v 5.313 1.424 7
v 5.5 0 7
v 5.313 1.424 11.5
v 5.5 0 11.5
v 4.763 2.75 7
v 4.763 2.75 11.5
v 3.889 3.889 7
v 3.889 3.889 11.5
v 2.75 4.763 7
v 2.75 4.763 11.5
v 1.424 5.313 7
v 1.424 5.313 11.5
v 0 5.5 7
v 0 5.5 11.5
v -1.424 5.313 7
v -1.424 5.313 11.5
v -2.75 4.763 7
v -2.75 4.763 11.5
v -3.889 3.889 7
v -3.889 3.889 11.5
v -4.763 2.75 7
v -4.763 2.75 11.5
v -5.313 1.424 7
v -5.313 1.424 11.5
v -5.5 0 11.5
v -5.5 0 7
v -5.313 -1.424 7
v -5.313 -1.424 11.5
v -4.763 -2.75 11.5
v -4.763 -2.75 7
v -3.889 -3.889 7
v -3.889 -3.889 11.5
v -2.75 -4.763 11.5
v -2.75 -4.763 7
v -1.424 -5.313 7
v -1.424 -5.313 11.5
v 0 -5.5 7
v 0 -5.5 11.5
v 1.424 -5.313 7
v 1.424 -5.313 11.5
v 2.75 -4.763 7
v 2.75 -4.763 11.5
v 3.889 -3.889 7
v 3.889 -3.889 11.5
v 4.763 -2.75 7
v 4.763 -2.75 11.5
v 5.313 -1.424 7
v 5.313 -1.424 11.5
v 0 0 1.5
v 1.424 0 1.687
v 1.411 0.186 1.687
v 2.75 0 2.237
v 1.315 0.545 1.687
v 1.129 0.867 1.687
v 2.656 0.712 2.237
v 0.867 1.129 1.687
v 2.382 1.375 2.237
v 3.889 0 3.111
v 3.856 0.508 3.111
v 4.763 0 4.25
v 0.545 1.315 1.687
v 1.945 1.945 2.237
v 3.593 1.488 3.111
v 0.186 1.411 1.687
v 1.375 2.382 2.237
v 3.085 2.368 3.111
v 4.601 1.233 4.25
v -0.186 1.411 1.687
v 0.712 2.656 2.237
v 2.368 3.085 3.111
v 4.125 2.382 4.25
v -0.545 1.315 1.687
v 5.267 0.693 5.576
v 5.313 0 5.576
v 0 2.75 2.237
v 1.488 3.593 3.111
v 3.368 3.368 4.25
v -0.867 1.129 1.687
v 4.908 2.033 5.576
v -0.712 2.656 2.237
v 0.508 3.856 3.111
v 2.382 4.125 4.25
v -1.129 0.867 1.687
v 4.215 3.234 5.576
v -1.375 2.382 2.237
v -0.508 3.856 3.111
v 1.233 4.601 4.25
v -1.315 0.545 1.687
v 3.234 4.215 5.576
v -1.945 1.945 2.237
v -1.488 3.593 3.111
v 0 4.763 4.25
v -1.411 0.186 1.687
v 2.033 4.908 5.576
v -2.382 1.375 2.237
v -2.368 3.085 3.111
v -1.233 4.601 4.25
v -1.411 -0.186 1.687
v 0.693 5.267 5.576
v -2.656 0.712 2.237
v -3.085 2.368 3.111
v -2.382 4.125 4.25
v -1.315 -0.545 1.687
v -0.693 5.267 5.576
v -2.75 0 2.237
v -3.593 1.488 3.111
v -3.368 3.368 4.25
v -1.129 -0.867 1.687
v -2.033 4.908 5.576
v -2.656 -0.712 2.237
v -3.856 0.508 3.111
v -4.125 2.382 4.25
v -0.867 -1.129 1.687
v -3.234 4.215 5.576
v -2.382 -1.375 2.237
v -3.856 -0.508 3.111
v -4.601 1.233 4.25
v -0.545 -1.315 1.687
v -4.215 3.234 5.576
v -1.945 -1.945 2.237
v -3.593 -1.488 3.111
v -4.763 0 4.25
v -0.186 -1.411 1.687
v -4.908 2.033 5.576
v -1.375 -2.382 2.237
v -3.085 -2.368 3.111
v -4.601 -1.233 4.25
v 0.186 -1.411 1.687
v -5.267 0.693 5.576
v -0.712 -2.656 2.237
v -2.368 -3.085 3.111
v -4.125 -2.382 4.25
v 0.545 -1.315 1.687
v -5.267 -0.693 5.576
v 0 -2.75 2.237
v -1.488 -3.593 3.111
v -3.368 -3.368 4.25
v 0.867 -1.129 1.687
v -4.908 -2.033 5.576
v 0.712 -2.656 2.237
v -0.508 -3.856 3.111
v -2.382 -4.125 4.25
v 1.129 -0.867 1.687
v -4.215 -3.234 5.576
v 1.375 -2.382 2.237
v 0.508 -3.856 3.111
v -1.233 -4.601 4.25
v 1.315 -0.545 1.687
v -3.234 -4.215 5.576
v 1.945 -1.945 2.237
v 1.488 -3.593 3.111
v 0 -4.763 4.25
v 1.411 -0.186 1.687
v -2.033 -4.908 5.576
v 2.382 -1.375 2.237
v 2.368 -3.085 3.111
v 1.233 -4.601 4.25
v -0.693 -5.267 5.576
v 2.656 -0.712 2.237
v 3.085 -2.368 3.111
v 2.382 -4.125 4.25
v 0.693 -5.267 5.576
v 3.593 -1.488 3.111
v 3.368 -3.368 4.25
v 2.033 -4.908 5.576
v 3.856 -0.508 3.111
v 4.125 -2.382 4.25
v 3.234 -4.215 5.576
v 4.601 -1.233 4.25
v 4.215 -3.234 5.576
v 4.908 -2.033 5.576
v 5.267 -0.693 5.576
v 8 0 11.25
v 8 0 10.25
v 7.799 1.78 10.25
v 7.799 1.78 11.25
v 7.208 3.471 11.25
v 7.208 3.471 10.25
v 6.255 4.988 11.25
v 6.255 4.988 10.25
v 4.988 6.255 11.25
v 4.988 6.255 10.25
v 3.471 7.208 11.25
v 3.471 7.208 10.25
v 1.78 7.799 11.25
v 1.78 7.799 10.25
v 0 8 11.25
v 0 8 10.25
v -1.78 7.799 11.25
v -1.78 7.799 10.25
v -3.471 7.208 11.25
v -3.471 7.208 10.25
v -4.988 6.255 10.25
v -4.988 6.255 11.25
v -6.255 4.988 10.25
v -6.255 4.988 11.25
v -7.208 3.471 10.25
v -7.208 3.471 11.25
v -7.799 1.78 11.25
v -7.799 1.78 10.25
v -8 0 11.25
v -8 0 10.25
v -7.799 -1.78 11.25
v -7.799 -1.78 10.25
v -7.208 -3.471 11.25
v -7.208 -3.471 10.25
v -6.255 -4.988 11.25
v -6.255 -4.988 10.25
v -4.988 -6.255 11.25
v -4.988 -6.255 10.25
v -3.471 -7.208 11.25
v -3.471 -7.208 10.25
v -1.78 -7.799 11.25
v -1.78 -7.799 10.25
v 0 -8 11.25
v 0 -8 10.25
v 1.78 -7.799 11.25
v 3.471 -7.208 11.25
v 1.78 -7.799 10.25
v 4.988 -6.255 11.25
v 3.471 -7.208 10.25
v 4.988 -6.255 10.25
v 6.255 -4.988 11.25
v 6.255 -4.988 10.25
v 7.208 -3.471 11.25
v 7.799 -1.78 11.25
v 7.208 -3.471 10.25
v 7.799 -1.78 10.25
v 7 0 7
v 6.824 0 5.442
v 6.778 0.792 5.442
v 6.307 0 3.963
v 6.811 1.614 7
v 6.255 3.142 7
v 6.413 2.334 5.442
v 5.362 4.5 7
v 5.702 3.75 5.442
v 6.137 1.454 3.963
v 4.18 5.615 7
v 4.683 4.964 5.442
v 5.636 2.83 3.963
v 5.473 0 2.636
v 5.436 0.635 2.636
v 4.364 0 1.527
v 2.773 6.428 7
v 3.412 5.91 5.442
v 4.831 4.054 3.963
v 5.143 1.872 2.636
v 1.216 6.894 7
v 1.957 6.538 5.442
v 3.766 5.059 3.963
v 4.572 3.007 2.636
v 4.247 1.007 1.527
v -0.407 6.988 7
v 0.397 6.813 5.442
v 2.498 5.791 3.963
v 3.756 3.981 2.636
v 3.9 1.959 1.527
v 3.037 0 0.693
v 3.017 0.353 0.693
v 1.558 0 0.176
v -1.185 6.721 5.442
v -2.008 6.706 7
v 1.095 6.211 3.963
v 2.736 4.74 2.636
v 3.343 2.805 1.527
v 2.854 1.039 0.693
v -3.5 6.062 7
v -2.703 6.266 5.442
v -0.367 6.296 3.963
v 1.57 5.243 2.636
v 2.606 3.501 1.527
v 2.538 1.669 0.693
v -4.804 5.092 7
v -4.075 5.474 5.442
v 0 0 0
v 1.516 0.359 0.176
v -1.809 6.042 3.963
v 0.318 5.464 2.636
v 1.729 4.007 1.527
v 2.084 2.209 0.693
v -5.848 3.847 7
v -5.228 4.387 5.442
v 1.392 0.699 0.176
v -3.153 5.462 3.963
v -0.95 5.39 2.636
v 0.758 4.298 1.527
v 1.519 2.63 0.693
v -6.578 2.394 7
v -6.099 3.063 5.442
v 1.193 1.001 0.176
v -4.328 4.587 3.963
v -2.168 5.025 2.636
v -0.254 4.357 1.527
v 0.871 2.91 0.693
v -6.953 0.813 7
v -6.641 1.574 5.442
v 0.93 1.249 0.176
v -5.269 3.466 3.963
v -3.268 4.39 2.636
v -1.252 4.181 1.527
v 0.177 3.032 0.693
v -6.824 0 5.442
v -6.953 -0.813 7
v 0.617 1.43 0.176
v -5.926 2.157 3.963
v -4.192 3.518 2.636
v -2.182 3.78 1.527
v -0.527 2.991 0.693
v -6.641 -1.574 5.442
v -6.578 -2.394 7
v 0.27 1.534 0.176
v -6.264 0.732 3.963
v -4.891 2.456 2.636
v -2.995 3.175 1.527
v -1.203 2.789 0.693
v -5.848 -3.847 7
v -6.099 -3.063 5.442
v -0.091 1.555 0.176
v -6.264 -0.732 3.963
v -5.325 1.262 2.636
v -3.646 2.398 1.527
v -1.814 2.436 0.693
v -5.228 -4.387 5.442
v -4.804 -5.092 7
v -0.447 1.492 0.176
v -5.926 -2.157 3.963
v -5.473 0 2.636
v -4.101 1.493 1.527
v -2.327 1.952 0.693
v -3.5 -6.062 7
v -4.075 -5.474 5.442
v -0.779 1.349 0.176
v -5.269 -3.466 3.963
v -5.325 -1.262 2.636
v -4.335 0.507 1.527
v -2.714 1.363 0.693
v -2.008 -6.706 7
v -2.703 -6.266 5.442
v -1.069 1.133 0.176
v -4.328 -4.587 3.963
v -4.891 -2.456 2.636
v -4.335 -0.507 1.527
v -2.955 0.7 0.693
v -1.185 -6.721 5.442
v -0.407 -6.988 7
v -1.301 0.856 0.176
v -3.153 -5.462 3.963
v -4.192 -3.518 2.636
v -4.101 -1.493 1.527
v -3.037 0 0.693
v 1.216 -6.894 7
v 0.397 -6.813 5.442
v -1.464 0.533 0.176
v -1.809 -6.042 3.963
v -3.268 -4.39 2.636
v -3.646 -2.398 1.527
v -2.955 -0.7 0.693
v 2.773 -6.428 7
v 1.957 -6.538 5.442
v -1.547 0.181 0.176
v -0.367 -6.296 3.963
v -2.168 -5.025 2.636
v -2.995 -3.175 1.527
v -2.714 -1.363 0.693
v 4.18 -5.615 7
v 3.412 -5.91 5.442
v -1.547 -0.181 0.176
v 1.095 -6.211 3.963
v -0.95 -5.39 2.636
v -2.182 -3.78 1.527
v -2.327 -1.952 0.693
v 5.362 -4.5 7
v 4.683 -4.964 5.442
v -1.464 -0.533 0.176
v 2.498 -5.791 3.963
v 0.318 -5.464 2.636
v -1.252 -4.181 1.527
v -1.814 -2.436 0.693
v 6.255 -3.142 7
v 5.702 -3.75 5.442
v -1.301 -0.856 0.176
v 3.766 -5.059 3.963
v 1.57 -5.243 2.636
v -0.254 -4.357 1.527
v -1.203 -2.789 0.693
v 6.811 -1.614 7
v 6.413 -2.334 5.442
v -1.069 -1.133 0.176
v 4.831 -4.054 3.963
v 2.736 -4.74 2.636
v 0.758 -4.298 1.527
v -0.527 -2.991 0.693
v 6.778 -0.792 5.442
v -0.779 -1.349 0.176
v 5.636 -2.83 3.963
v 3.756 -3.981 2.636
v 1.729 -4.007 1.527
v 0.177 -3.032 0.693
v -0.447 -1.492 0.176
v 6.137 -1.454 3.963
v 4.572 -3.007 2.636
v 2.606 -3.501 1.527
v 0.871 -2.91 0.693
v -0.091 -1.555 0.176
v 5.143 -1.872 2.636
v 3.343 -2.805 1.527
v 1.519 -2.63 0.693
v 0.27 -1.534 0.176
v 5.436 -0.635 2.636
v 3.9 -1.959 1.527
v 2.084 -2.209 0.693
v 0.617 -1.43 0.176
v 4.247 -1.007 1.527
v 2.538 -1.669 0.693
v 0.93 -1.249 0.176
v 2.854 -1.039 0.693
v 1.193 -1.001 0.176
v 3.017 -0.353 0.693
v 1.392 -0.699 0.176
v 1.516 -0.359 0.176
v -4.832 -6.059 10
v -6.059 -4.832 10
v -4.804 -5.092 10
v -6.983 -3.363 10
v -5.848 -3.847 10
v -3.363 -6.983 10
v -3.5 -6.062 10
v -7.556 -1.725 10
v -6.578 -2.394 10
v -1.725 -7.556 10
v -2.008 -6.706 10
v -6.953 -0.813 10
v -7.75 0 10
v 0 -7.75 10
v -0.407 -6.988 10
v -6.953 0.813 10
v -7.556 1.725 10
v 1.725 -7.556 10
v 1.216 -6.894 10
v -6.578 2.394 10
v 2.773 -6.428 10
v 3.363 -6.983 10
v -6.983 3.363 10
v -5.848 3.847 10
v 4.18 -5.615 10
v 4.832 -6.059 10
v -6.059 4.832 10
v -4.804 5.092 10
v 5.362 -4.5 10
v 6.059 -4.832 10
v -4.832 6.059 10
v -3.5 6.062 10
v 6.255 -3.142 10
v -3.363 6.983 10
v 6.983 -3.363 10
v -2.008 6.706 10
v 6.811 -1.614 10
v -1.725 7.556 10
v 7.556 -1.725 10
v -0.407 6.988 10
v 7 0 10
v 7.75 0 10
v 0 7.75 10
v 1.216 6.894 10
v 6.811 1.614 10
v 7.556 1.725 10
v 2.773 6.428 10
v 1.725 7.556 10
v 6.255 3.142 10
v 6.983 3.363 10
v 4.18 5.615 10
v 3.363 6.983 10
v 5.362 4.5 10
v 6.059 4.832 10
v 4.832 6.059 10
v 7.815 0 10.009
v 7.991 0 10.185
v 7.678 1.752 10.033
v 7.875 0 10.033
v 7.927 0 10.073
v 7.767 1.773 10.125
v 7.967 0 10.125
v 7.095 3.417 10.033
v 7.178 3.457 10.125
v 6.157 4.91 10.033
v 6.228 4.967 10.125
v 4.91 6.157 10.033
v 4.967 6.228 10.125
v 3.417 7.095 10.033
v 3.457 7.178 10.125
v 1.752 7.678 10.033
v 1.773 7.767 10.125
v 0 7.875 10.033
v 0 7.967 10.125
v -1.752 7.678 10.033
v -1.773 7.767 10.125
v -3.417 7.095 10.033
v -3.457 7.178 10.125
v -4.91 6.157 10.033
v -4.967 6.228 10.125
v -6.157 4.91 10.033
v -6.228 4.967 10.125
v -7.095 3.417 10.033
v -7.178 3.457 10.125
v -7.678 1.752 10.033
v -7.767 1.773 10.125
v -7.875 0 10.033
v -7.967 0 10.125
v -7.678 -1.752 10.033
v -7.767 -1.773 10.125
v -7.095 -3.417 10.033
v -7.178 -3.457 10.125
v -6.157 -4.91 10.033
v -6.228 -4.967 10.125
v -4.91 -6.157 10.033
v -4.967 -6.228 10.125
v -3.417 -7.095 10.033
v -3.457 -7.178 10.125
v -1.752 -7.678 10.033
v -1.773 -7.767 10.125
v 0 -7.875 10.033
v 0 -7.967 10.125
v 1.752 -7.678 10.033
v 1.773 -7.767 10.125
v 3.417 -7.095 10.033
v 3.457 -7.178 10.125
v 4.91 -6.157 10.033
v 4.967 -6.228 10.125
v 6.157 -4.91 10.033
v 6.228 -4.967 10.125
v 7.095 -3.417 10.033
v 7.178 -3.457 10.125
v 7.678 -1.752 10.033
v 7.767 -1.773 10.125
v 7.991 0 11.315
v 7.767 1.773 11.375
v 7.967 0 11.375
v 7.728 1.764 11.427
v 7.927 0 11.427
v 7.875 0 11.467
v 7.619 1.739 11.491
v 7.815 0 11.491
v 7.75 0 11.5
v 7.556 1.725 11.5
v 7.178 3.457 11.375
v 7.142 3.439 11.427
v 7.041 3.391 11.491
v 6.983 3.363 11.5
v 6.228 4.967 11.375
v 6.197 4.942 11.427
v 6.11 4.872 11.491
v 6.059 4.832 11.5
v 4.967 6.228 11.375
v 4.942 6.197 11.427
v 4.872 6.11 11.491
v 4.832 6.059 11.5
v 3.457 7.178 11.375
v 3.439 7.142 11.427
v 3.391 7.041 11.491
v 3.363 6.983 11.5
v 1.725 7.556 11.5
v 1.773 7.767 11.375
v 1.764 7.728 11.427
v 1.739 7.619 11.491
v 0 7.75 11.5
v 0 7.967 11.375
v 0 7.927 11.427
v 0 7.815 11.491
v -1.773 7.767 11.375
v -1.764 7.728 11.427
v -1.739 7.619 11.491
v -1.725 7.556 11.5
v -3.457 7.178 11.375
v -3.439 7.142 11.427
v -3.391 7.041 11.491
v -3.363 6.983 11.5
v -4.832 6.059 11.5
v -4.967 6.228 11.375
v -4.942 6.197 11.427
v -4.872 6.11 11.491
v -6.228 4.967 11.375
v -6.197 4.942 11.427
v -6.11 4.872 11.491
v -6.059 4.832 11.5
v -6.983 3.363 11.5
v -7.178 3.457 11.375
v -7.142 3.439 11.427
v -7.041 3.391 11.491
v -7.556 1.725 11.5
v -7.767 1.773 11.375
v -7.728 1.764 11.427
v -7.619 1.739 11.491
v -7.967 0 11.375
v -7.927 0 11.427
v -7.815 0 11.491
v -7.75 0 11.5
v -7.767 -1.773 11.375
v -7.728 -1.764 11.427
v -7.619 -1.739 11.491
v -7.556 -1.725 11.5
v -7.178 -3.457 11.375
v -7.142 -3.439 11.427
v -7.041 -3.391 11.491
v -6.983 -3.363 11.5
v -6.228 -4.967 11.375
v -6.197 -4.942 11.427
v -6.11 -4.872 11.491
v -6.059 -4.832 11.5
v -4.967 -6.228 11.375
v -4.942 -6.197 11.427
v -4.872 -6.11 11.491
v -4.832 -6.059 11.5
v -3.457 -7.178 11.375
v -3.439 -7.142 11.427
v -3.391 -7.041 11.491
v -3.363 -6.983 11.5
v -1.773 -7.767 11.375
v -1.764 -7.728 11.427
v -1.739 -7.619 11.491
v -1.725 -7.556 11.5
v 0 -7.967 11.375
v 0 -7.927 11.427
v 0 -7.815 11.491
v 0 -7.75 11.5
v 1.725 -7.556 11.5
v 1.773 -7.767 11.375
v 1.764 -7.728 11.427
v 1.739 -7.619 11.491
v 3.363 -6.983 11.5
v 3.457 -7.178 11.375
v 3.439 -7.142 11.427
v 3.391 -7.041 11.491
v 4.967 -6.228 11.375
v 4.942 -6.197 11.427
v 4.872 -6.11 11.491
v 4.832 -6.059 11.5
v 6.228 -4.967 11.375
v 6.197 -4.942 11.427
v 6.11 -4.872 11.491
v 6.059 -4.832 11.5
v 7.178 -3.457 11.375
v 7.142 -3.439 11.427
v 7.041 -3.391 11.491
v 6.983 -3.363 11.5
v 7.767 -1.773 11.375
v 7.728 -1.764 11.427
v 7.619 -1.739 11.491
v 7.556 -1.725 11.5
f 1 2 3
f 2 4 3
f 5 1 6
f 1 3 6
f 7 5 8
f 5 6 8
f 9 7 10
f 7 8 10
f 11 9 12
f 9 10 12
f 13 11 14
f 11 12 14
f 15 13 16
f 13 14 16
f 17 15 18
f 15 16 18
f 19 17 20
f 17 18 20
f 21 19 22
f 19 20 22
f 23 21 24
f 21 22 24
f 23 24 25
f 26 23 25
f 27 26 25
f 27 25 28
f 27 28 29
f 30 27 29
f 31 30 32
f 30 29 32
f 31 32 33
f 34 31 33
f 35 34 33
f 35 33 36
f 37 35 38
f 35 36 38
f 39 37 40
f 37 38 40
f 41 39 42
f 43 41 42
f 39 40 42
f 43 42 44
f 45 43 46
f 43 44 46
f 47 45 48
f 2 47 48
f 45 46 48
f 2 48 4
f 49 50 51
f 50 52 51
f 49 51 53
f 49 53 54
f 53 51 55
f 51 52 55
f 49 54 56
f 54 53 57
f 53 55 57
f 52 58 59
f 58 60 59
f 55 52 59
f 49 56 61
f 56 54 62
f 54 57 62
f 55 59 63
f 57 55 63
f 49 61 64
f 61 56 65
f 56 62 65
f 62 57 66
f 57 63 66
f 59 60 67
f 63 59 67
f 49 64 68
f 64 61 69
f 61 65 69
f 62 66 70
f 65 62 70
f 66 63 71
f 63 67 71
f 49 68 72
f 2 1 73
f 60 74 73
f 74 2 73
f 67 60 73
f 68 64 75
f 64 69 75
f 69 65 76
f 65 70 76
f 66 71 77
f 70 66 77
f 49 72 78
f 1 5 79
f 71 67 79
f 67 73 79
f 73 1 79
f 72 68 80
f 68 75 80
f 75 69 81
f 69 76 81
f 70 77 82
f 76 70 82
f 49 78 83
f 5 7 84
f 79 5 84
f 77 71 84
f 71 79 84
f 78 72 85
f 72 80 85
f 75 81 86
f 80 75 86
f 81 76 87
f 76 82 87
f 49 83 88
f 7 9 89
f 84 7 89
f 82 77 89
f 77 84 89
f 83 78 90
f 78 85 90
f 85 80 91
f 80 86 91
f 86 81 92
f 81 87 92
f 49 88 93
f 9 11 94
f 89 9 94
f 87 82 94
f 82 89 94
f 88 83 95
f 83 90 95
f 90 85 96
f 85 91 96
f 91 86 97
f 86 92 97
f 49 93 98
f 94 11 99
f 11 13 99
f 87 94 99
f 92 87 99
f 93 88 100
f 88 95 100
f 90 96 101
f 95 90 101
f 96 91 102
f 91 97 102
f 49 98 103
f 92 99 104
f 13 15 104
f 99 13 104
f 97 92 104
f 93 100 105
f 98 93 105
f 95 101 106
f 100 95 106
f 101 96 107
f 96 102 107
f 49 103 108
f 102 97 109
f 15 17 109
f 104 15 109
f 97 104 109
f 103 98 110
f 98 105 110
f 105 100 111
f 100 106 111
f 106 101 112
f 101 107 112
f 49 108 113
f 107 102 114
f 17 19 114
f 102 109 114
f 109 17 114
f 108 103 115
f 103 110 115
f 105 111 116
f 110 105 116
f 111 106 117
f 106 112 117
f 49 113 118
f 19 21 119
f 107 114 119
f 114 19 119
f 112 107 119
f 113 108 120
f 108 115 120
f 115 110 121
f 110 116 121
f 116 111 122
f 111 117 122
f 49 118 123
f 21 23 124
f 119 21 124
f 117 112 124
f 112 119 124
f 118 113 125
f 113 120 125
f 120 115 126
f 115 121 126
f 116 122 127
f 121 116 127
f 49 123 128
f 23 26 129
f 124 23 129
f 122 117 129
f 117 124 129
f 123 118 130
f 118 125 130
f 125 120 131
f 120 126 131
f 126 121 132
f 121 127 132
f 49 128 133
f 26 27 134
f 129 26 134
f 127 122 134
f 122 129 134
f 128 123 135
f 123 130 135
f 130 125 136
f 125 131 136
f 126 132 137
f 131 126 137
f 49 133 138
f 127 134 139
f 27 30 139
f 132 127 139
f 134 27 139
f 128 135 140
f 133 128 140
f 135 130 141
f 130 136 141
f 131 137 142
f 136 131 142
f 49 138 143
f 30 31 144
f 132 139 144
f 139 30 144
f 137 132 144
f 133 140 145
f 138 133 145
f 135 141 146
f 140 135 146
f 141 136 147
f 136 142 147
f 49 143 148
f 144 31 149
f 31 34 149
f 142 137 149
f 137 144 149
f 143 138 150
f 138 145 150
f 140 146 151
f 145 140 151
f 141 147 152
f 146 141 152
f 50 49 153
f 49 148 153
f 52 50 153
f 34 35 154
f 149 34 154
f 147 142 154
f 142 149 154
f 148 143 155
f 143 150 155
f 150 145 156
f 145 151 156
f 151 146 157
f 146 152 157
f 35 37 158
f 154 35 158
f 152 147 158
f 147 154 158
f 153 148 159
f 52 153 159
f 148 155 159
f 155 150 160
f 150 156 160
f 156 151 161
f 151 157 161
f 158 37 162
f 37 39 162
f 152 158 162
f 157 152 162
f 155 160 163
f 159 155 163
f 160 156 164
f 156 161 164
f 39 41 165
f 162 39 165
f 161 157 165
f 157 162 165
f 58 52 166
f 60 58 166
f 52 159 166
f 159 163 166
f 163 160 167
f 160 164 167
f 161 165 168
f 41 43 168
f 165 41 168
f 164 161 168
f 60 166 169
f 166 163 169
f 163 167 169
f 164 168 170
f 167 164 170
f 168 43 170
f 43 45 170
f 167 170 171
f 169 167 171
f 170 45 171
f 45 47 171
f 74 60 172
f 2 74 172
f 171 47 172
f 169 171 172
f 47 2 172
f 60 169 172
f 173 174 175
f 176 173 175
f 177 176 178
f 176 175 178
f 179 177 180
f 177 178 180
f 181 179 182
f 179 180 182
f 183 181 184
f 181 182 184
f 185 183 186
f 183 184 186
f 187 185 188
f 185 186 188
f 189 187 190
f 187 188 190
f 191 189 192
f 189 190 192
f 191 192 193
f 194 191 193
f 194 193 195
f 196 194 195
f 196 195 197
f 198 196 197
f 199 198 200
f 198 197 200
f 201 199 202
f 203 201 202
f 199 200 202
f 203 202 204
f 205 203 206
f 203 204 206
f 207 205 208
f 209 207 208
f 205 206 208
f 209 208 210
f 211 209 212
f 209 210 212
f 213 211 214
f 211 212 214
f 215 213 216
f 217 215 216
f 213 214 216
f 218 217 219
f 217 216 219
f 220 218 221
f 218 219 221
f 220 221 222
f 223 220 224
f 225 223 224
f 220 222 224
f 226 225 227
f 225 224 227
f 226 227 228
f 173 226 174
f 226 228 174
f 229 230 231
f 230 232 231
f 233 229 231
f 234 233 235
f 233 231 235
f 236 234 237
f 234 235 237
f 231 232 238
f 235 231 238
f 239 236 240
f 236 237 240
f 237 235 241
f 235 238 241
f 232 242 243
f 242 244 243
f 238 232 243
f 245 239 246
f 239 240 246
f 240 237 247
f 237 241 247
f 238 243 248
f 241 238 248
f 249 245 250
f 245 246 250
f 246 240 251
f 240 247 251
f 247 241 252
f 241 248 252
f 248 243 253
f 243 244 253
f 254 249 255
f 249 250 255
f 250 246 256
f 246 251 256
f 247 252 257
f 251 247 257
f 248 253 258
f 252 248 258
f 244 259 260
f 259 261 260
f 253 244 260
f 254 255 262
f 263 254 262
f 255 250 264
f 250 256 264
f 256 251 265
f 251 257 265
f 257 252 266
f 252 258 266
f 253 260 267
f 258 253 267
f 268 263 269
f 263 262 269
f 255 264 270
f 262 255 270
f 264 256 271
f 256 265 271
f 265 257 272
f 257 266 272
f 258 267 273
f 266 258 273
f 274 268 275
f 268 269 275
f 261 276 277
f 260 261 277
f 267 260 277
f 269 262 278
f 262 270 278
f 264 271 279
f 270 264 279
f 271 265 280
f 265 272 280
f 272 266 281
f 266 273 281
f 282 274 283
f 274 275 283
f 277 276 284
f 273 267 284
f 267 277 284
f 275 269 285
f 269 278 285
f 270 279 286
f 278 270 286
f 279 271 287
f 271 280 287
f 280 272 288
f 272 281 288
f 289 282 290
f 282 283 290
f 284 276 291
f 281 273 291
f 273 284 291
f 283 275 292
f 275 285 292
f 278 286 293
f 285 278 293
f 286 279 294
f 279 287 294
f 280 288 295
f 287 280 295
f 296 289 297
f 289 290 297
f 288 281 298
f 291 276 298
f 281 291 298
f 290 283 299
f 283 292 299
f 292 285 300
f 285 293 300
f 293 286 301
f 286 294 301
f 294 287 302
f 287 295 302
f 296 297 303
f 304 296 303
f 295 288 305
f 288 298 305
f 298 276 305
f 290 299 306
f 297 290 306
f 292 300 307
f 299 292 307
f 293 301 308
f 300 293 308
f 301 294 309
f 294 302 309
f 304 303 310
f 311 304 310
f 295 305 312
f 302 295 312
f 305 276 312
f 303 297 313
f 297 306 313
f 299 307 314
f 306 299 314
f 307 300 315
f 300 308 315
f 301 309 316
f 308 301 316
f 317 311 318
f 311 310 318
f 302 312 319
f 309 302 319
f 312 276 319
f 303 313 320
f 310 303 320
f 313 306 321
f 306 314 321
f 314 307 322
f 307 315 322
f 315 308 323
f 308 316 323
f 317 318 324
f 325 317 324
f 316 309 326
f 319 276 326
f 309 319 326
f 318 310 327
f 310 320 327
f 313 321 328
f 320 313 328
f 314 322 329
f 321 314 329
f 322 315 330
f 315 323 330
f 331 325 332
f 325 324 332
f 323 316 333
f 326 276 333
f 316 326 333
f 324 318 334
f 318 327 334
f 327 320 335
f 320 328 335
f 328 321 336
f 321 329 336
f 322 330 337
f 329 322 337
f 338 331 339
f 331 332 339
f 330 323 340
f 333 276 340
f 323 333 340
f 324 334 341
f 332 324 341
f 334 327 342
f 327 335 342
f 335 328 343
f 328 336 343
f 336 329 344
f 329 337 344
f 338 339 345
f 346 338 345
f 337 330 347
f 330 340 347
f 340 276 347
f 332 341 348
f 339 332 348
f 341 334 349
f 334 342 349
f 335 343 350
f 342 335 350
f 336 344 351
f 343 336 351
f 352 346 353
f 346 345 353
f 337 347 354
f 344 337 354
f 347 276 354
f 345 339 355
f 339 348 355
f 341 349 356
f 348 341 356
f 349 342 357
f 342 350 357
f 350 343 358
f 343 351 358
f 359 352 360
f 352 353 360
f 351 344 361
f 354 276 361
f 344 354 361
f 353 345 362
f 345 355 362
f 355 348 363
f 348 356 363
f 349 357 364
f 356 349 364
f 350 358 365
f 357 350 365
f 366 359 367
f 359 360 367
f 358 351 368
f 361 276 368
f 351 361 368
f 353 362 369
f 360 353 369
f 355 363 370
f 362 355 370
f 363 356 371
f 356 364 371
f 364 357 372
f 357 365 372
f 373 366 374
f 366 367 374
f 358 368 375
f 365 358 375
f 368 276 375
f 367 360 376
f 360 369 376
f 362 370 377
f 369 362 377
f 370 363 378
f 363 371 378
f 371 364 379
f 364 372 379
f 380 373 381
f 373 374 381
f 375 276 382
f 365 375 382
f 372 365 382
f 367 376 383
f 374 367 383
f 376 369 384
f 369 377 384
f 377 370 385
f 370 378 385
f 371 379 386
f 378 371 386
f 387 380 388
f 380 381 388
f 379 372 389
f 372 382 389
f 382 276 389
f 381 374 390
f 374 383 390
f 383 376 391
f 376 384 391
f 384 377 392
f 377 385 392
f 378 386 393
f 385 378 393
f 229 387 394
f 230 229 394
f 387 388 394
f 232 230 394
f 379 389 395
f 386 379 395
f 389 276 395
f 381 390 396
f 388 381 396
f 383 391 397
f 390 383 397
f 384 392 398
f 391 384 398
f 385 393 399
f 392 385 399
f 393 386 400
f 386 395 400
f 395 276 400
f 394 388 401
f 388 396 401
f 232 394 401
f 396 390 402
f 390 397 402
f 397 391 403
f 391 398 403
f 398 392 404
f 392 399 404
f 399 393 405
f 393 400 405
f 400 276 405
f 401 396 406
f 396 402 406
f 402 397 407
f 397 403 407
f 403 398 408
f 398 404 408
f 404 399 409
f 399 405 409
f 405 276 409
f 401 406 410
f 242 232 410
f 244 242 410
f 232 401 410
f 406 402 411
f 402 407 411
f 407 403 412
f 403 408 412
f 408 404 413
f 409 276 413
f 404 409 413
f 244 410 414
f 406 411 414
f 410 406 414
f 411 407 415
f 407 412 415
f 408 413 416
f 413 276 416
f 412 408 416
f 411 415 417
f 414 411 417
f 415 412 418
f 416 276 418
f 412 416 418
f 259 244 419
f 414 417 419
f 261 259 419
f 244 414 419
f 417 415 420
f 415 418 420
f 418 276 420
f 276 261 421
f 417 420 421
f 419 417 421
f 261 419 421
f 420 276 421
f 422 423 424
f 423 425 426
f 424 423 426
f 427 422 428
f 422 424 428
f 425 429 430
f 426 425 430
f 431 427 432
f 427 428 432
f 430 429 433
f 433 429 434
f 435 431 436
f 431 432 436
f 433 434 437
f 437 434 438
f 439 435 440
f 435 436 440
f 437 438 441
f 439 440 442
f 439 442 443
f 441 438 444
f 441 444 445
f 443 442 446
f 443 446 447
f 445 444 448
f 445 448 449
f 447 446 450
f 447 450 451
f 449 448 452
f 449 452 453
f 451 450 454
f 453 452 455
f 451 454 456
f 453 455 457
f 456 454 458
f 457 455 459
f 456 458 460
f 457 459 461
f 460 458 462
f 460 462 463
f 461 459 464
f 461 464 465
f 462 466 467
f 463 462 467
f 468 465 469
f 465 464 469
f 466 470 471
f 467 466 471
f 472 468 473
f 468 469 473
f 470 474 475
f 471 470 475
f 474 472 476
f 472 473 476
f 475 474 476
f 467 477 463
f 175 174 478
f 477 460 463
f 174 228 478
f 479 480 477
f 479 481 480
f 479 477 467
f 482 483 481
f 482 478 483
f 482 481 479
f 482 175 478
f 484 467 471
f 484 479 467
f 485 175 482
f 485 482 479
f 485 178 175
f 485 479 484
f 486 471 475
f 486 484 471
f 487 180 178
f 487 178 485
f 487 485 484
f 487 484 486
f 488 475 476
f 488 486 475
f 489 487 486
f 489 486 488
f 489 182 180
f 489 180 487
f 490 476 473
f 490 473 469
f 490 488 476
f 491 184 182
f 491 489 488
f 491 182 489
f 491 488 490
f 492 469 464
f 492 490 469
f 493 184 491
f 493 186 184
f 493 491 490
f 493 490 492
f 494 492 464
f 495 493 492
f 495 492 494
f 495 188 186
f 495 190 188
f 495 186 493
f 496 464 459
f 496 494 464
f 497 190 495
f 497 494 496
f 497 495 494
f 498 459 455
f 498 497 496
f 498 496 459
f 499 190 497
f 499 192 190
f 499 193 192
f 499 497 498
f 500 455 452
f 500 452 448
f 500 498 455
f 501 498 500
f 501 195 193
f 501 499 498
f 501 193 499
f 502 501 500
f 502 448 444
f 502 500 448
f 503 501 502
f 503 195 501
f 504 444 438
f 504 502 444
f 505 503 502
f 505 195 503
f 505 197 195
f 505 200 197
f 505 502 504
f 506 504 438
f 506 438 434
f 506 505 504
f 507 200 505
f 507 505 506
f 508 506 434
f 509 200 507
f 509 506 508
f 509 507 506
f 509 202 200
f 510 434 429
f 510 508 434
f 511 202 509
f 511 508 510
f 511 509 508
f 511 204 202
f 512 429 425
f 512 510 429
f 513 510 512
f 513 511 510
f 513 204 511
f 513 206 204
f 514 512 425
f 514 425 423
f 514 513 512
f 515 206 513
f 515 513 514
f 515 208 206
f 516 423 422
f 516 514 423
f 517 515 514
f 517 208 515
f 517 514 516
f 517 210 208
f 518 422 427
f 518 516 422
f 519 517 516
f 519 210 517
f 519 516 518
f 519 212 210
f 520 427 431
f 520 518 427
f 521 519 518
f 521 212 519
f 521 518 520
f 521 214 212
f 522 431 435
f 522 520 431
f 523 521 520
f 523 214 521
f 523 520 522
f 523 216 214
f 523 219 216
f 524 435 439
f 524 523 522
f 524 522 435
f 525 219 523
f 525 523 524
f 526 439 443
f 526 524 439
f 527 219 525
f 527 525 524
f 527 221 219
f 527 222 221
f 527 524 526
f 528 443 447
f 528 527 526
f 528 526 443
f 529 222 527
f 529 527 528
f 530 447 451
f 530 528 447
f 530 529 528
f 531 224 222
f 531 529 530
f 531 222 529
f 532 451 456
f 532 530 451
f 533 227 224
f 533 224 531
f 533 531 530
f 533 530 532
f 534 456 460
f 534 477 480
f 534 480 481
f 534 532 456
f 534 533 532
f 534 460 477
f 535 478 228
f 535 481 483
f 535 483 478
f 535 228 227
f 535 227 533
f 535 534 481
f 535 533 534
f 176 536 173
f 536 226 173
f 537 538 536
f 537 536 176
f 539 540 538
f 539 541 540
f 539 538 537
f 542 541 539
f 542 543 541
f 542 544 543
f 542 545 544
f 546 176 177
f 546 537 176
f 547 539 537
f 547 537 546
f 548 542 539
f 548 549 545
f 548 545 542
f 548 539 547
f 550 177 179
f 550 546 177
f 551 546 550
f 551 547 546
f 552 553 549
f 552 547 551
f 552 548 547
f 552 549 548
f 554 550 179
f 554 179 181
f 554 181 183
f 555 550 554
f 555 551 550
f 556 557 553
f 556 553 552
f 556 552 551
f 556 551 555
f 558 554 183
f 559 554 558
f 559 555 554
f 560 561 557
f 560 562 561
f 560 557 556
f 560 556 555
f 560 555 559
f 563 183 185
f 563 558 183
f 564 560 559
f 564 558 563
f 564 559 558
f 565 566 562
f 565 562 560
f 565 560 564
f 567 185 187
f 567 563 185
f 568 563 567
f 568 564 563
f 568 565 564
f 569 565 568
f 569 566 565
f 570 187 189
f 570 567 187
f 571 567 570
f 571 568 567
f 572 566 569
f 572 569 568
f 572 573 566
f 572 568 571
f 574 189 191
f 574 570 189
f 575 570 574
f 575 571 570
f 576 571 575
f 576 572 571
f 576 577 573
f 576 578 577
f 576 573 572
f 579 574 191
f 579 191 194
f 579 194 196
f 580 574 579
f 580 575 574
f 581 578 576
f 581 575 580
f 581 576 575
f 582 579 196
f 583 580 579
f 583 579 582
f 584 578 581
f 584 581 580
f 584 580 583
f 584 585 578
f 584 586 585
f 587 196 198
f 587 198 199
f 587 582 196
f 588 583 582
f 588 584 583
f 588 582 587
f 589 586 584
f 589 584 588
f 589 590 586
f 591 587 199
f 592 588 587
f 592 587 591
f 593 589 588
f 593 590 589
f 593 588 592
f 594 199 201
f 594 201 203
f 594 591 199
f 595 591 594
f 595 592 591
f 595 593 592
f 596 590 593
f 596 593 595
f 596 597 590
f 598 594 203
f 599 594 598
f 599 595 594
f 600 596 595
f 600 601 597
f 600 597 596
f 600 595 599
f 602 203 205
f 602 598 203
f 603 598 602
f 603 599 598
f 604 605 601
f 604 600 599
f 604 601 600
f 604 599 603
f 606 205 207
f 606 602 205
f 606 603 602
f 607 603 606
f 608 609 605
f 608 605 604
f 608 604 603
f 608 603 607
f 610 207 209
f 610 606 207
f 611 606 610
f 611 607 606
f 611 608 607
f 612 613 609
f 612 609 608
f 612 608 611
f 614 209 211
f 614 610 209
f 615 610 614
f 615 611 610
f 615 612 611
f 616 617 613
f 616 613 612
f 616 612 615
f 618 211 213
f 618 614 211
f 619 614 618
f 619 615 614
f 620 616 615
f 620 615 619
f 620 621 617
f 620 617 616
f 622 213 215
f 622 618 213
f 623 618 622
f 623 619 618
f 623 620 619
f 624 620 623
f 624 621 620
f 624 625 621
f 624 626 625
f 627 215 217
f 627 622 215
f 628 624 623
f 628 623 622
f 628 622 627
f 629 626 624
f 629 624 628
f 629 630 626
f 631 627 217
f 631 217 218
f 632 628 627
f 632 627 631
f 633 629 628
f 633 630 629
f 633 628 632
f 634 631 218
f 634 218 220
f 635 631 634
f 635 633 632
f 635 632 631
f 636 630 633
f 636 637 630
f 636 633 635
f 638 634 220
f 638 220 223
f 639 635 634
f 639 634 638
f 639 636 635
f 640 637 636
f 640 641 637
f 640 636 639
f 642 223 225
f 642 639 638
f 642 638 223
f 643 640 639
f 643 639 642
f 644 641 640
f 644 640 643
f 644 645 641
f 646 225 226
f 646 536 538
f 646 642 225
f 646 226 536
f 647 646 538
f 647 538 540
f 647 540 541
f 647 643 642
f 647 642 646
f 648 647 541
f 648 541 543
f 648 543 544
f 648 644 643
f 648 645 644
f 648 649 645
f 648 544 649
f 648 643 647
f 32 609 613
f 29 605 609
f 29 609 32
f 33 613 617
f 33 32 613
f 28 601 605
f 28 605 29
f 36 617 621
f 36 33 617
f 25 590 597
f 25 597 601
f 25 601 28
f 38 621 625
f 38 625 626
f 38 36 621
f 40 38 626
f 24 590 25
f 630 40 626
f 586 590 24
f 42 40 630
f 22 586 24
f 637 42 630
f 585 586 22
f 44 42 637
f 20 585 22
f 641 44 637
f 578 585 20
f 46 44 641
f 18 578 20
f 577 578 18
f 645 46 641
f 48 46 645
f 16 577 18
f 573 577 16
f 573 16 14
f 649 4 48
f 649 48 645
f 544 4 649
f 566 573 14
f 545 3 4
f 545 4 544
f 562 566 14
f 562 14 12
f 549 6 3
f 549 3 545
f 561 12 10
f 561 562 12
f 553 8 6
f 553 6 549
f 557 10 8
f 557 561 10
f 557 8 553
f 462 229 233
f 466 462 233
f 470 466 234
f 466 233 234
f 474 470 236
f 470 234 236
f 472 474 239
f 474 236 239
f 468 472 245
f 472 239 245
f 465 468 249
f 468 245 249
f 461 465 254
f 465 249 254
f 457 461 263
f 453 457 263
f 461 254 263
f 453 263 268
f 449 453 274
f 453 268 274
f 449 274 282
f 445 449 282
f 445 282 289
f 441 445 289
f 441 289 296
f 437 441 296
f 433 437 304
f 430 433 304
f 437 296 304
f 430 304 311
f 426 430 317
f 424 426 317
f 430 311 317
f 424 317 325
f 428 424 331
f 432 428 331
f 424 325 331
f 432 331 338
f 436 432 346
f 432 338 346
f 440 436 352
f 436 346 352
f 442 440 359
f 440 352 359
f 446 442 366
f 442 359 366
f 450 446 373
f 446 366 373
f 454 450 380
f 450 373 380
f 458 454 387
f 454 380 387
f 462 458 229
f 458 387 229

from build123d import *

# Parameters (mm, degrees)
SKETCH2_R           = 7
BOSS_EXTRUDE1_DEPTH = 10
SKETCH3_R           = 8
BOSS_EXTRUDE2_DEPTH = 1.5
FILLET3_R           = 7
FILLET4_R           = 0.25


# Read off the part's stored shape, not the designer's step: Shell1
with BuildPart() as part:
    # Sketch2 → Boss-Extrude1 (new body)
    with BuildSketch(Plane.XY):
        Circle(SKETCH2_R)
    extrude(amount=BOSS_EXTRUDE1_DEPTH)

    # Sketch3 → Boss-Extrude2 (add)
    with BuildSketch(Plane.XY.offset(10)):
        Circle(SKETCH3_R)
    extrude(amount=BOSS_EXTRUDE2_DEPTH)

    # Fillet3
    fillet3_edges = [part.edges().sort_by_distance(p)[0] for p in [
        (-7, 0, 0),
    ]]
    fillet(fillet3_edges, radius=FILLET3_R)

    # Shell1 outline → Shell1 (revolve, cut)
    with BuildSketch(Plane.XZ):
        with BuildLine():
            Line((5.5, 7.000000005), (5.5, 11.5))
            Line((5.5, 11.5), (0, 11.5))
            Line((0, 11.5), (0, 1.5))
            ThreePointArc((0, 1.5), (3.889087298, 3.110912705), (5.5, 7.000000005))
        make_face()
    revolve(axis=Axis((0, 0, 0), (0, 0, 1)), mode=Mode.SUBTRACT)

    # Fillet4
    fillet4_edges = [part.edges().sort_by_distance(p)[0] for p in [
        (-8, 0, 10),
        (-8, 0, 11.5),
    ]]
    fillet(fillet4_edges, radius=FILLET4_R)


solid = part.part
